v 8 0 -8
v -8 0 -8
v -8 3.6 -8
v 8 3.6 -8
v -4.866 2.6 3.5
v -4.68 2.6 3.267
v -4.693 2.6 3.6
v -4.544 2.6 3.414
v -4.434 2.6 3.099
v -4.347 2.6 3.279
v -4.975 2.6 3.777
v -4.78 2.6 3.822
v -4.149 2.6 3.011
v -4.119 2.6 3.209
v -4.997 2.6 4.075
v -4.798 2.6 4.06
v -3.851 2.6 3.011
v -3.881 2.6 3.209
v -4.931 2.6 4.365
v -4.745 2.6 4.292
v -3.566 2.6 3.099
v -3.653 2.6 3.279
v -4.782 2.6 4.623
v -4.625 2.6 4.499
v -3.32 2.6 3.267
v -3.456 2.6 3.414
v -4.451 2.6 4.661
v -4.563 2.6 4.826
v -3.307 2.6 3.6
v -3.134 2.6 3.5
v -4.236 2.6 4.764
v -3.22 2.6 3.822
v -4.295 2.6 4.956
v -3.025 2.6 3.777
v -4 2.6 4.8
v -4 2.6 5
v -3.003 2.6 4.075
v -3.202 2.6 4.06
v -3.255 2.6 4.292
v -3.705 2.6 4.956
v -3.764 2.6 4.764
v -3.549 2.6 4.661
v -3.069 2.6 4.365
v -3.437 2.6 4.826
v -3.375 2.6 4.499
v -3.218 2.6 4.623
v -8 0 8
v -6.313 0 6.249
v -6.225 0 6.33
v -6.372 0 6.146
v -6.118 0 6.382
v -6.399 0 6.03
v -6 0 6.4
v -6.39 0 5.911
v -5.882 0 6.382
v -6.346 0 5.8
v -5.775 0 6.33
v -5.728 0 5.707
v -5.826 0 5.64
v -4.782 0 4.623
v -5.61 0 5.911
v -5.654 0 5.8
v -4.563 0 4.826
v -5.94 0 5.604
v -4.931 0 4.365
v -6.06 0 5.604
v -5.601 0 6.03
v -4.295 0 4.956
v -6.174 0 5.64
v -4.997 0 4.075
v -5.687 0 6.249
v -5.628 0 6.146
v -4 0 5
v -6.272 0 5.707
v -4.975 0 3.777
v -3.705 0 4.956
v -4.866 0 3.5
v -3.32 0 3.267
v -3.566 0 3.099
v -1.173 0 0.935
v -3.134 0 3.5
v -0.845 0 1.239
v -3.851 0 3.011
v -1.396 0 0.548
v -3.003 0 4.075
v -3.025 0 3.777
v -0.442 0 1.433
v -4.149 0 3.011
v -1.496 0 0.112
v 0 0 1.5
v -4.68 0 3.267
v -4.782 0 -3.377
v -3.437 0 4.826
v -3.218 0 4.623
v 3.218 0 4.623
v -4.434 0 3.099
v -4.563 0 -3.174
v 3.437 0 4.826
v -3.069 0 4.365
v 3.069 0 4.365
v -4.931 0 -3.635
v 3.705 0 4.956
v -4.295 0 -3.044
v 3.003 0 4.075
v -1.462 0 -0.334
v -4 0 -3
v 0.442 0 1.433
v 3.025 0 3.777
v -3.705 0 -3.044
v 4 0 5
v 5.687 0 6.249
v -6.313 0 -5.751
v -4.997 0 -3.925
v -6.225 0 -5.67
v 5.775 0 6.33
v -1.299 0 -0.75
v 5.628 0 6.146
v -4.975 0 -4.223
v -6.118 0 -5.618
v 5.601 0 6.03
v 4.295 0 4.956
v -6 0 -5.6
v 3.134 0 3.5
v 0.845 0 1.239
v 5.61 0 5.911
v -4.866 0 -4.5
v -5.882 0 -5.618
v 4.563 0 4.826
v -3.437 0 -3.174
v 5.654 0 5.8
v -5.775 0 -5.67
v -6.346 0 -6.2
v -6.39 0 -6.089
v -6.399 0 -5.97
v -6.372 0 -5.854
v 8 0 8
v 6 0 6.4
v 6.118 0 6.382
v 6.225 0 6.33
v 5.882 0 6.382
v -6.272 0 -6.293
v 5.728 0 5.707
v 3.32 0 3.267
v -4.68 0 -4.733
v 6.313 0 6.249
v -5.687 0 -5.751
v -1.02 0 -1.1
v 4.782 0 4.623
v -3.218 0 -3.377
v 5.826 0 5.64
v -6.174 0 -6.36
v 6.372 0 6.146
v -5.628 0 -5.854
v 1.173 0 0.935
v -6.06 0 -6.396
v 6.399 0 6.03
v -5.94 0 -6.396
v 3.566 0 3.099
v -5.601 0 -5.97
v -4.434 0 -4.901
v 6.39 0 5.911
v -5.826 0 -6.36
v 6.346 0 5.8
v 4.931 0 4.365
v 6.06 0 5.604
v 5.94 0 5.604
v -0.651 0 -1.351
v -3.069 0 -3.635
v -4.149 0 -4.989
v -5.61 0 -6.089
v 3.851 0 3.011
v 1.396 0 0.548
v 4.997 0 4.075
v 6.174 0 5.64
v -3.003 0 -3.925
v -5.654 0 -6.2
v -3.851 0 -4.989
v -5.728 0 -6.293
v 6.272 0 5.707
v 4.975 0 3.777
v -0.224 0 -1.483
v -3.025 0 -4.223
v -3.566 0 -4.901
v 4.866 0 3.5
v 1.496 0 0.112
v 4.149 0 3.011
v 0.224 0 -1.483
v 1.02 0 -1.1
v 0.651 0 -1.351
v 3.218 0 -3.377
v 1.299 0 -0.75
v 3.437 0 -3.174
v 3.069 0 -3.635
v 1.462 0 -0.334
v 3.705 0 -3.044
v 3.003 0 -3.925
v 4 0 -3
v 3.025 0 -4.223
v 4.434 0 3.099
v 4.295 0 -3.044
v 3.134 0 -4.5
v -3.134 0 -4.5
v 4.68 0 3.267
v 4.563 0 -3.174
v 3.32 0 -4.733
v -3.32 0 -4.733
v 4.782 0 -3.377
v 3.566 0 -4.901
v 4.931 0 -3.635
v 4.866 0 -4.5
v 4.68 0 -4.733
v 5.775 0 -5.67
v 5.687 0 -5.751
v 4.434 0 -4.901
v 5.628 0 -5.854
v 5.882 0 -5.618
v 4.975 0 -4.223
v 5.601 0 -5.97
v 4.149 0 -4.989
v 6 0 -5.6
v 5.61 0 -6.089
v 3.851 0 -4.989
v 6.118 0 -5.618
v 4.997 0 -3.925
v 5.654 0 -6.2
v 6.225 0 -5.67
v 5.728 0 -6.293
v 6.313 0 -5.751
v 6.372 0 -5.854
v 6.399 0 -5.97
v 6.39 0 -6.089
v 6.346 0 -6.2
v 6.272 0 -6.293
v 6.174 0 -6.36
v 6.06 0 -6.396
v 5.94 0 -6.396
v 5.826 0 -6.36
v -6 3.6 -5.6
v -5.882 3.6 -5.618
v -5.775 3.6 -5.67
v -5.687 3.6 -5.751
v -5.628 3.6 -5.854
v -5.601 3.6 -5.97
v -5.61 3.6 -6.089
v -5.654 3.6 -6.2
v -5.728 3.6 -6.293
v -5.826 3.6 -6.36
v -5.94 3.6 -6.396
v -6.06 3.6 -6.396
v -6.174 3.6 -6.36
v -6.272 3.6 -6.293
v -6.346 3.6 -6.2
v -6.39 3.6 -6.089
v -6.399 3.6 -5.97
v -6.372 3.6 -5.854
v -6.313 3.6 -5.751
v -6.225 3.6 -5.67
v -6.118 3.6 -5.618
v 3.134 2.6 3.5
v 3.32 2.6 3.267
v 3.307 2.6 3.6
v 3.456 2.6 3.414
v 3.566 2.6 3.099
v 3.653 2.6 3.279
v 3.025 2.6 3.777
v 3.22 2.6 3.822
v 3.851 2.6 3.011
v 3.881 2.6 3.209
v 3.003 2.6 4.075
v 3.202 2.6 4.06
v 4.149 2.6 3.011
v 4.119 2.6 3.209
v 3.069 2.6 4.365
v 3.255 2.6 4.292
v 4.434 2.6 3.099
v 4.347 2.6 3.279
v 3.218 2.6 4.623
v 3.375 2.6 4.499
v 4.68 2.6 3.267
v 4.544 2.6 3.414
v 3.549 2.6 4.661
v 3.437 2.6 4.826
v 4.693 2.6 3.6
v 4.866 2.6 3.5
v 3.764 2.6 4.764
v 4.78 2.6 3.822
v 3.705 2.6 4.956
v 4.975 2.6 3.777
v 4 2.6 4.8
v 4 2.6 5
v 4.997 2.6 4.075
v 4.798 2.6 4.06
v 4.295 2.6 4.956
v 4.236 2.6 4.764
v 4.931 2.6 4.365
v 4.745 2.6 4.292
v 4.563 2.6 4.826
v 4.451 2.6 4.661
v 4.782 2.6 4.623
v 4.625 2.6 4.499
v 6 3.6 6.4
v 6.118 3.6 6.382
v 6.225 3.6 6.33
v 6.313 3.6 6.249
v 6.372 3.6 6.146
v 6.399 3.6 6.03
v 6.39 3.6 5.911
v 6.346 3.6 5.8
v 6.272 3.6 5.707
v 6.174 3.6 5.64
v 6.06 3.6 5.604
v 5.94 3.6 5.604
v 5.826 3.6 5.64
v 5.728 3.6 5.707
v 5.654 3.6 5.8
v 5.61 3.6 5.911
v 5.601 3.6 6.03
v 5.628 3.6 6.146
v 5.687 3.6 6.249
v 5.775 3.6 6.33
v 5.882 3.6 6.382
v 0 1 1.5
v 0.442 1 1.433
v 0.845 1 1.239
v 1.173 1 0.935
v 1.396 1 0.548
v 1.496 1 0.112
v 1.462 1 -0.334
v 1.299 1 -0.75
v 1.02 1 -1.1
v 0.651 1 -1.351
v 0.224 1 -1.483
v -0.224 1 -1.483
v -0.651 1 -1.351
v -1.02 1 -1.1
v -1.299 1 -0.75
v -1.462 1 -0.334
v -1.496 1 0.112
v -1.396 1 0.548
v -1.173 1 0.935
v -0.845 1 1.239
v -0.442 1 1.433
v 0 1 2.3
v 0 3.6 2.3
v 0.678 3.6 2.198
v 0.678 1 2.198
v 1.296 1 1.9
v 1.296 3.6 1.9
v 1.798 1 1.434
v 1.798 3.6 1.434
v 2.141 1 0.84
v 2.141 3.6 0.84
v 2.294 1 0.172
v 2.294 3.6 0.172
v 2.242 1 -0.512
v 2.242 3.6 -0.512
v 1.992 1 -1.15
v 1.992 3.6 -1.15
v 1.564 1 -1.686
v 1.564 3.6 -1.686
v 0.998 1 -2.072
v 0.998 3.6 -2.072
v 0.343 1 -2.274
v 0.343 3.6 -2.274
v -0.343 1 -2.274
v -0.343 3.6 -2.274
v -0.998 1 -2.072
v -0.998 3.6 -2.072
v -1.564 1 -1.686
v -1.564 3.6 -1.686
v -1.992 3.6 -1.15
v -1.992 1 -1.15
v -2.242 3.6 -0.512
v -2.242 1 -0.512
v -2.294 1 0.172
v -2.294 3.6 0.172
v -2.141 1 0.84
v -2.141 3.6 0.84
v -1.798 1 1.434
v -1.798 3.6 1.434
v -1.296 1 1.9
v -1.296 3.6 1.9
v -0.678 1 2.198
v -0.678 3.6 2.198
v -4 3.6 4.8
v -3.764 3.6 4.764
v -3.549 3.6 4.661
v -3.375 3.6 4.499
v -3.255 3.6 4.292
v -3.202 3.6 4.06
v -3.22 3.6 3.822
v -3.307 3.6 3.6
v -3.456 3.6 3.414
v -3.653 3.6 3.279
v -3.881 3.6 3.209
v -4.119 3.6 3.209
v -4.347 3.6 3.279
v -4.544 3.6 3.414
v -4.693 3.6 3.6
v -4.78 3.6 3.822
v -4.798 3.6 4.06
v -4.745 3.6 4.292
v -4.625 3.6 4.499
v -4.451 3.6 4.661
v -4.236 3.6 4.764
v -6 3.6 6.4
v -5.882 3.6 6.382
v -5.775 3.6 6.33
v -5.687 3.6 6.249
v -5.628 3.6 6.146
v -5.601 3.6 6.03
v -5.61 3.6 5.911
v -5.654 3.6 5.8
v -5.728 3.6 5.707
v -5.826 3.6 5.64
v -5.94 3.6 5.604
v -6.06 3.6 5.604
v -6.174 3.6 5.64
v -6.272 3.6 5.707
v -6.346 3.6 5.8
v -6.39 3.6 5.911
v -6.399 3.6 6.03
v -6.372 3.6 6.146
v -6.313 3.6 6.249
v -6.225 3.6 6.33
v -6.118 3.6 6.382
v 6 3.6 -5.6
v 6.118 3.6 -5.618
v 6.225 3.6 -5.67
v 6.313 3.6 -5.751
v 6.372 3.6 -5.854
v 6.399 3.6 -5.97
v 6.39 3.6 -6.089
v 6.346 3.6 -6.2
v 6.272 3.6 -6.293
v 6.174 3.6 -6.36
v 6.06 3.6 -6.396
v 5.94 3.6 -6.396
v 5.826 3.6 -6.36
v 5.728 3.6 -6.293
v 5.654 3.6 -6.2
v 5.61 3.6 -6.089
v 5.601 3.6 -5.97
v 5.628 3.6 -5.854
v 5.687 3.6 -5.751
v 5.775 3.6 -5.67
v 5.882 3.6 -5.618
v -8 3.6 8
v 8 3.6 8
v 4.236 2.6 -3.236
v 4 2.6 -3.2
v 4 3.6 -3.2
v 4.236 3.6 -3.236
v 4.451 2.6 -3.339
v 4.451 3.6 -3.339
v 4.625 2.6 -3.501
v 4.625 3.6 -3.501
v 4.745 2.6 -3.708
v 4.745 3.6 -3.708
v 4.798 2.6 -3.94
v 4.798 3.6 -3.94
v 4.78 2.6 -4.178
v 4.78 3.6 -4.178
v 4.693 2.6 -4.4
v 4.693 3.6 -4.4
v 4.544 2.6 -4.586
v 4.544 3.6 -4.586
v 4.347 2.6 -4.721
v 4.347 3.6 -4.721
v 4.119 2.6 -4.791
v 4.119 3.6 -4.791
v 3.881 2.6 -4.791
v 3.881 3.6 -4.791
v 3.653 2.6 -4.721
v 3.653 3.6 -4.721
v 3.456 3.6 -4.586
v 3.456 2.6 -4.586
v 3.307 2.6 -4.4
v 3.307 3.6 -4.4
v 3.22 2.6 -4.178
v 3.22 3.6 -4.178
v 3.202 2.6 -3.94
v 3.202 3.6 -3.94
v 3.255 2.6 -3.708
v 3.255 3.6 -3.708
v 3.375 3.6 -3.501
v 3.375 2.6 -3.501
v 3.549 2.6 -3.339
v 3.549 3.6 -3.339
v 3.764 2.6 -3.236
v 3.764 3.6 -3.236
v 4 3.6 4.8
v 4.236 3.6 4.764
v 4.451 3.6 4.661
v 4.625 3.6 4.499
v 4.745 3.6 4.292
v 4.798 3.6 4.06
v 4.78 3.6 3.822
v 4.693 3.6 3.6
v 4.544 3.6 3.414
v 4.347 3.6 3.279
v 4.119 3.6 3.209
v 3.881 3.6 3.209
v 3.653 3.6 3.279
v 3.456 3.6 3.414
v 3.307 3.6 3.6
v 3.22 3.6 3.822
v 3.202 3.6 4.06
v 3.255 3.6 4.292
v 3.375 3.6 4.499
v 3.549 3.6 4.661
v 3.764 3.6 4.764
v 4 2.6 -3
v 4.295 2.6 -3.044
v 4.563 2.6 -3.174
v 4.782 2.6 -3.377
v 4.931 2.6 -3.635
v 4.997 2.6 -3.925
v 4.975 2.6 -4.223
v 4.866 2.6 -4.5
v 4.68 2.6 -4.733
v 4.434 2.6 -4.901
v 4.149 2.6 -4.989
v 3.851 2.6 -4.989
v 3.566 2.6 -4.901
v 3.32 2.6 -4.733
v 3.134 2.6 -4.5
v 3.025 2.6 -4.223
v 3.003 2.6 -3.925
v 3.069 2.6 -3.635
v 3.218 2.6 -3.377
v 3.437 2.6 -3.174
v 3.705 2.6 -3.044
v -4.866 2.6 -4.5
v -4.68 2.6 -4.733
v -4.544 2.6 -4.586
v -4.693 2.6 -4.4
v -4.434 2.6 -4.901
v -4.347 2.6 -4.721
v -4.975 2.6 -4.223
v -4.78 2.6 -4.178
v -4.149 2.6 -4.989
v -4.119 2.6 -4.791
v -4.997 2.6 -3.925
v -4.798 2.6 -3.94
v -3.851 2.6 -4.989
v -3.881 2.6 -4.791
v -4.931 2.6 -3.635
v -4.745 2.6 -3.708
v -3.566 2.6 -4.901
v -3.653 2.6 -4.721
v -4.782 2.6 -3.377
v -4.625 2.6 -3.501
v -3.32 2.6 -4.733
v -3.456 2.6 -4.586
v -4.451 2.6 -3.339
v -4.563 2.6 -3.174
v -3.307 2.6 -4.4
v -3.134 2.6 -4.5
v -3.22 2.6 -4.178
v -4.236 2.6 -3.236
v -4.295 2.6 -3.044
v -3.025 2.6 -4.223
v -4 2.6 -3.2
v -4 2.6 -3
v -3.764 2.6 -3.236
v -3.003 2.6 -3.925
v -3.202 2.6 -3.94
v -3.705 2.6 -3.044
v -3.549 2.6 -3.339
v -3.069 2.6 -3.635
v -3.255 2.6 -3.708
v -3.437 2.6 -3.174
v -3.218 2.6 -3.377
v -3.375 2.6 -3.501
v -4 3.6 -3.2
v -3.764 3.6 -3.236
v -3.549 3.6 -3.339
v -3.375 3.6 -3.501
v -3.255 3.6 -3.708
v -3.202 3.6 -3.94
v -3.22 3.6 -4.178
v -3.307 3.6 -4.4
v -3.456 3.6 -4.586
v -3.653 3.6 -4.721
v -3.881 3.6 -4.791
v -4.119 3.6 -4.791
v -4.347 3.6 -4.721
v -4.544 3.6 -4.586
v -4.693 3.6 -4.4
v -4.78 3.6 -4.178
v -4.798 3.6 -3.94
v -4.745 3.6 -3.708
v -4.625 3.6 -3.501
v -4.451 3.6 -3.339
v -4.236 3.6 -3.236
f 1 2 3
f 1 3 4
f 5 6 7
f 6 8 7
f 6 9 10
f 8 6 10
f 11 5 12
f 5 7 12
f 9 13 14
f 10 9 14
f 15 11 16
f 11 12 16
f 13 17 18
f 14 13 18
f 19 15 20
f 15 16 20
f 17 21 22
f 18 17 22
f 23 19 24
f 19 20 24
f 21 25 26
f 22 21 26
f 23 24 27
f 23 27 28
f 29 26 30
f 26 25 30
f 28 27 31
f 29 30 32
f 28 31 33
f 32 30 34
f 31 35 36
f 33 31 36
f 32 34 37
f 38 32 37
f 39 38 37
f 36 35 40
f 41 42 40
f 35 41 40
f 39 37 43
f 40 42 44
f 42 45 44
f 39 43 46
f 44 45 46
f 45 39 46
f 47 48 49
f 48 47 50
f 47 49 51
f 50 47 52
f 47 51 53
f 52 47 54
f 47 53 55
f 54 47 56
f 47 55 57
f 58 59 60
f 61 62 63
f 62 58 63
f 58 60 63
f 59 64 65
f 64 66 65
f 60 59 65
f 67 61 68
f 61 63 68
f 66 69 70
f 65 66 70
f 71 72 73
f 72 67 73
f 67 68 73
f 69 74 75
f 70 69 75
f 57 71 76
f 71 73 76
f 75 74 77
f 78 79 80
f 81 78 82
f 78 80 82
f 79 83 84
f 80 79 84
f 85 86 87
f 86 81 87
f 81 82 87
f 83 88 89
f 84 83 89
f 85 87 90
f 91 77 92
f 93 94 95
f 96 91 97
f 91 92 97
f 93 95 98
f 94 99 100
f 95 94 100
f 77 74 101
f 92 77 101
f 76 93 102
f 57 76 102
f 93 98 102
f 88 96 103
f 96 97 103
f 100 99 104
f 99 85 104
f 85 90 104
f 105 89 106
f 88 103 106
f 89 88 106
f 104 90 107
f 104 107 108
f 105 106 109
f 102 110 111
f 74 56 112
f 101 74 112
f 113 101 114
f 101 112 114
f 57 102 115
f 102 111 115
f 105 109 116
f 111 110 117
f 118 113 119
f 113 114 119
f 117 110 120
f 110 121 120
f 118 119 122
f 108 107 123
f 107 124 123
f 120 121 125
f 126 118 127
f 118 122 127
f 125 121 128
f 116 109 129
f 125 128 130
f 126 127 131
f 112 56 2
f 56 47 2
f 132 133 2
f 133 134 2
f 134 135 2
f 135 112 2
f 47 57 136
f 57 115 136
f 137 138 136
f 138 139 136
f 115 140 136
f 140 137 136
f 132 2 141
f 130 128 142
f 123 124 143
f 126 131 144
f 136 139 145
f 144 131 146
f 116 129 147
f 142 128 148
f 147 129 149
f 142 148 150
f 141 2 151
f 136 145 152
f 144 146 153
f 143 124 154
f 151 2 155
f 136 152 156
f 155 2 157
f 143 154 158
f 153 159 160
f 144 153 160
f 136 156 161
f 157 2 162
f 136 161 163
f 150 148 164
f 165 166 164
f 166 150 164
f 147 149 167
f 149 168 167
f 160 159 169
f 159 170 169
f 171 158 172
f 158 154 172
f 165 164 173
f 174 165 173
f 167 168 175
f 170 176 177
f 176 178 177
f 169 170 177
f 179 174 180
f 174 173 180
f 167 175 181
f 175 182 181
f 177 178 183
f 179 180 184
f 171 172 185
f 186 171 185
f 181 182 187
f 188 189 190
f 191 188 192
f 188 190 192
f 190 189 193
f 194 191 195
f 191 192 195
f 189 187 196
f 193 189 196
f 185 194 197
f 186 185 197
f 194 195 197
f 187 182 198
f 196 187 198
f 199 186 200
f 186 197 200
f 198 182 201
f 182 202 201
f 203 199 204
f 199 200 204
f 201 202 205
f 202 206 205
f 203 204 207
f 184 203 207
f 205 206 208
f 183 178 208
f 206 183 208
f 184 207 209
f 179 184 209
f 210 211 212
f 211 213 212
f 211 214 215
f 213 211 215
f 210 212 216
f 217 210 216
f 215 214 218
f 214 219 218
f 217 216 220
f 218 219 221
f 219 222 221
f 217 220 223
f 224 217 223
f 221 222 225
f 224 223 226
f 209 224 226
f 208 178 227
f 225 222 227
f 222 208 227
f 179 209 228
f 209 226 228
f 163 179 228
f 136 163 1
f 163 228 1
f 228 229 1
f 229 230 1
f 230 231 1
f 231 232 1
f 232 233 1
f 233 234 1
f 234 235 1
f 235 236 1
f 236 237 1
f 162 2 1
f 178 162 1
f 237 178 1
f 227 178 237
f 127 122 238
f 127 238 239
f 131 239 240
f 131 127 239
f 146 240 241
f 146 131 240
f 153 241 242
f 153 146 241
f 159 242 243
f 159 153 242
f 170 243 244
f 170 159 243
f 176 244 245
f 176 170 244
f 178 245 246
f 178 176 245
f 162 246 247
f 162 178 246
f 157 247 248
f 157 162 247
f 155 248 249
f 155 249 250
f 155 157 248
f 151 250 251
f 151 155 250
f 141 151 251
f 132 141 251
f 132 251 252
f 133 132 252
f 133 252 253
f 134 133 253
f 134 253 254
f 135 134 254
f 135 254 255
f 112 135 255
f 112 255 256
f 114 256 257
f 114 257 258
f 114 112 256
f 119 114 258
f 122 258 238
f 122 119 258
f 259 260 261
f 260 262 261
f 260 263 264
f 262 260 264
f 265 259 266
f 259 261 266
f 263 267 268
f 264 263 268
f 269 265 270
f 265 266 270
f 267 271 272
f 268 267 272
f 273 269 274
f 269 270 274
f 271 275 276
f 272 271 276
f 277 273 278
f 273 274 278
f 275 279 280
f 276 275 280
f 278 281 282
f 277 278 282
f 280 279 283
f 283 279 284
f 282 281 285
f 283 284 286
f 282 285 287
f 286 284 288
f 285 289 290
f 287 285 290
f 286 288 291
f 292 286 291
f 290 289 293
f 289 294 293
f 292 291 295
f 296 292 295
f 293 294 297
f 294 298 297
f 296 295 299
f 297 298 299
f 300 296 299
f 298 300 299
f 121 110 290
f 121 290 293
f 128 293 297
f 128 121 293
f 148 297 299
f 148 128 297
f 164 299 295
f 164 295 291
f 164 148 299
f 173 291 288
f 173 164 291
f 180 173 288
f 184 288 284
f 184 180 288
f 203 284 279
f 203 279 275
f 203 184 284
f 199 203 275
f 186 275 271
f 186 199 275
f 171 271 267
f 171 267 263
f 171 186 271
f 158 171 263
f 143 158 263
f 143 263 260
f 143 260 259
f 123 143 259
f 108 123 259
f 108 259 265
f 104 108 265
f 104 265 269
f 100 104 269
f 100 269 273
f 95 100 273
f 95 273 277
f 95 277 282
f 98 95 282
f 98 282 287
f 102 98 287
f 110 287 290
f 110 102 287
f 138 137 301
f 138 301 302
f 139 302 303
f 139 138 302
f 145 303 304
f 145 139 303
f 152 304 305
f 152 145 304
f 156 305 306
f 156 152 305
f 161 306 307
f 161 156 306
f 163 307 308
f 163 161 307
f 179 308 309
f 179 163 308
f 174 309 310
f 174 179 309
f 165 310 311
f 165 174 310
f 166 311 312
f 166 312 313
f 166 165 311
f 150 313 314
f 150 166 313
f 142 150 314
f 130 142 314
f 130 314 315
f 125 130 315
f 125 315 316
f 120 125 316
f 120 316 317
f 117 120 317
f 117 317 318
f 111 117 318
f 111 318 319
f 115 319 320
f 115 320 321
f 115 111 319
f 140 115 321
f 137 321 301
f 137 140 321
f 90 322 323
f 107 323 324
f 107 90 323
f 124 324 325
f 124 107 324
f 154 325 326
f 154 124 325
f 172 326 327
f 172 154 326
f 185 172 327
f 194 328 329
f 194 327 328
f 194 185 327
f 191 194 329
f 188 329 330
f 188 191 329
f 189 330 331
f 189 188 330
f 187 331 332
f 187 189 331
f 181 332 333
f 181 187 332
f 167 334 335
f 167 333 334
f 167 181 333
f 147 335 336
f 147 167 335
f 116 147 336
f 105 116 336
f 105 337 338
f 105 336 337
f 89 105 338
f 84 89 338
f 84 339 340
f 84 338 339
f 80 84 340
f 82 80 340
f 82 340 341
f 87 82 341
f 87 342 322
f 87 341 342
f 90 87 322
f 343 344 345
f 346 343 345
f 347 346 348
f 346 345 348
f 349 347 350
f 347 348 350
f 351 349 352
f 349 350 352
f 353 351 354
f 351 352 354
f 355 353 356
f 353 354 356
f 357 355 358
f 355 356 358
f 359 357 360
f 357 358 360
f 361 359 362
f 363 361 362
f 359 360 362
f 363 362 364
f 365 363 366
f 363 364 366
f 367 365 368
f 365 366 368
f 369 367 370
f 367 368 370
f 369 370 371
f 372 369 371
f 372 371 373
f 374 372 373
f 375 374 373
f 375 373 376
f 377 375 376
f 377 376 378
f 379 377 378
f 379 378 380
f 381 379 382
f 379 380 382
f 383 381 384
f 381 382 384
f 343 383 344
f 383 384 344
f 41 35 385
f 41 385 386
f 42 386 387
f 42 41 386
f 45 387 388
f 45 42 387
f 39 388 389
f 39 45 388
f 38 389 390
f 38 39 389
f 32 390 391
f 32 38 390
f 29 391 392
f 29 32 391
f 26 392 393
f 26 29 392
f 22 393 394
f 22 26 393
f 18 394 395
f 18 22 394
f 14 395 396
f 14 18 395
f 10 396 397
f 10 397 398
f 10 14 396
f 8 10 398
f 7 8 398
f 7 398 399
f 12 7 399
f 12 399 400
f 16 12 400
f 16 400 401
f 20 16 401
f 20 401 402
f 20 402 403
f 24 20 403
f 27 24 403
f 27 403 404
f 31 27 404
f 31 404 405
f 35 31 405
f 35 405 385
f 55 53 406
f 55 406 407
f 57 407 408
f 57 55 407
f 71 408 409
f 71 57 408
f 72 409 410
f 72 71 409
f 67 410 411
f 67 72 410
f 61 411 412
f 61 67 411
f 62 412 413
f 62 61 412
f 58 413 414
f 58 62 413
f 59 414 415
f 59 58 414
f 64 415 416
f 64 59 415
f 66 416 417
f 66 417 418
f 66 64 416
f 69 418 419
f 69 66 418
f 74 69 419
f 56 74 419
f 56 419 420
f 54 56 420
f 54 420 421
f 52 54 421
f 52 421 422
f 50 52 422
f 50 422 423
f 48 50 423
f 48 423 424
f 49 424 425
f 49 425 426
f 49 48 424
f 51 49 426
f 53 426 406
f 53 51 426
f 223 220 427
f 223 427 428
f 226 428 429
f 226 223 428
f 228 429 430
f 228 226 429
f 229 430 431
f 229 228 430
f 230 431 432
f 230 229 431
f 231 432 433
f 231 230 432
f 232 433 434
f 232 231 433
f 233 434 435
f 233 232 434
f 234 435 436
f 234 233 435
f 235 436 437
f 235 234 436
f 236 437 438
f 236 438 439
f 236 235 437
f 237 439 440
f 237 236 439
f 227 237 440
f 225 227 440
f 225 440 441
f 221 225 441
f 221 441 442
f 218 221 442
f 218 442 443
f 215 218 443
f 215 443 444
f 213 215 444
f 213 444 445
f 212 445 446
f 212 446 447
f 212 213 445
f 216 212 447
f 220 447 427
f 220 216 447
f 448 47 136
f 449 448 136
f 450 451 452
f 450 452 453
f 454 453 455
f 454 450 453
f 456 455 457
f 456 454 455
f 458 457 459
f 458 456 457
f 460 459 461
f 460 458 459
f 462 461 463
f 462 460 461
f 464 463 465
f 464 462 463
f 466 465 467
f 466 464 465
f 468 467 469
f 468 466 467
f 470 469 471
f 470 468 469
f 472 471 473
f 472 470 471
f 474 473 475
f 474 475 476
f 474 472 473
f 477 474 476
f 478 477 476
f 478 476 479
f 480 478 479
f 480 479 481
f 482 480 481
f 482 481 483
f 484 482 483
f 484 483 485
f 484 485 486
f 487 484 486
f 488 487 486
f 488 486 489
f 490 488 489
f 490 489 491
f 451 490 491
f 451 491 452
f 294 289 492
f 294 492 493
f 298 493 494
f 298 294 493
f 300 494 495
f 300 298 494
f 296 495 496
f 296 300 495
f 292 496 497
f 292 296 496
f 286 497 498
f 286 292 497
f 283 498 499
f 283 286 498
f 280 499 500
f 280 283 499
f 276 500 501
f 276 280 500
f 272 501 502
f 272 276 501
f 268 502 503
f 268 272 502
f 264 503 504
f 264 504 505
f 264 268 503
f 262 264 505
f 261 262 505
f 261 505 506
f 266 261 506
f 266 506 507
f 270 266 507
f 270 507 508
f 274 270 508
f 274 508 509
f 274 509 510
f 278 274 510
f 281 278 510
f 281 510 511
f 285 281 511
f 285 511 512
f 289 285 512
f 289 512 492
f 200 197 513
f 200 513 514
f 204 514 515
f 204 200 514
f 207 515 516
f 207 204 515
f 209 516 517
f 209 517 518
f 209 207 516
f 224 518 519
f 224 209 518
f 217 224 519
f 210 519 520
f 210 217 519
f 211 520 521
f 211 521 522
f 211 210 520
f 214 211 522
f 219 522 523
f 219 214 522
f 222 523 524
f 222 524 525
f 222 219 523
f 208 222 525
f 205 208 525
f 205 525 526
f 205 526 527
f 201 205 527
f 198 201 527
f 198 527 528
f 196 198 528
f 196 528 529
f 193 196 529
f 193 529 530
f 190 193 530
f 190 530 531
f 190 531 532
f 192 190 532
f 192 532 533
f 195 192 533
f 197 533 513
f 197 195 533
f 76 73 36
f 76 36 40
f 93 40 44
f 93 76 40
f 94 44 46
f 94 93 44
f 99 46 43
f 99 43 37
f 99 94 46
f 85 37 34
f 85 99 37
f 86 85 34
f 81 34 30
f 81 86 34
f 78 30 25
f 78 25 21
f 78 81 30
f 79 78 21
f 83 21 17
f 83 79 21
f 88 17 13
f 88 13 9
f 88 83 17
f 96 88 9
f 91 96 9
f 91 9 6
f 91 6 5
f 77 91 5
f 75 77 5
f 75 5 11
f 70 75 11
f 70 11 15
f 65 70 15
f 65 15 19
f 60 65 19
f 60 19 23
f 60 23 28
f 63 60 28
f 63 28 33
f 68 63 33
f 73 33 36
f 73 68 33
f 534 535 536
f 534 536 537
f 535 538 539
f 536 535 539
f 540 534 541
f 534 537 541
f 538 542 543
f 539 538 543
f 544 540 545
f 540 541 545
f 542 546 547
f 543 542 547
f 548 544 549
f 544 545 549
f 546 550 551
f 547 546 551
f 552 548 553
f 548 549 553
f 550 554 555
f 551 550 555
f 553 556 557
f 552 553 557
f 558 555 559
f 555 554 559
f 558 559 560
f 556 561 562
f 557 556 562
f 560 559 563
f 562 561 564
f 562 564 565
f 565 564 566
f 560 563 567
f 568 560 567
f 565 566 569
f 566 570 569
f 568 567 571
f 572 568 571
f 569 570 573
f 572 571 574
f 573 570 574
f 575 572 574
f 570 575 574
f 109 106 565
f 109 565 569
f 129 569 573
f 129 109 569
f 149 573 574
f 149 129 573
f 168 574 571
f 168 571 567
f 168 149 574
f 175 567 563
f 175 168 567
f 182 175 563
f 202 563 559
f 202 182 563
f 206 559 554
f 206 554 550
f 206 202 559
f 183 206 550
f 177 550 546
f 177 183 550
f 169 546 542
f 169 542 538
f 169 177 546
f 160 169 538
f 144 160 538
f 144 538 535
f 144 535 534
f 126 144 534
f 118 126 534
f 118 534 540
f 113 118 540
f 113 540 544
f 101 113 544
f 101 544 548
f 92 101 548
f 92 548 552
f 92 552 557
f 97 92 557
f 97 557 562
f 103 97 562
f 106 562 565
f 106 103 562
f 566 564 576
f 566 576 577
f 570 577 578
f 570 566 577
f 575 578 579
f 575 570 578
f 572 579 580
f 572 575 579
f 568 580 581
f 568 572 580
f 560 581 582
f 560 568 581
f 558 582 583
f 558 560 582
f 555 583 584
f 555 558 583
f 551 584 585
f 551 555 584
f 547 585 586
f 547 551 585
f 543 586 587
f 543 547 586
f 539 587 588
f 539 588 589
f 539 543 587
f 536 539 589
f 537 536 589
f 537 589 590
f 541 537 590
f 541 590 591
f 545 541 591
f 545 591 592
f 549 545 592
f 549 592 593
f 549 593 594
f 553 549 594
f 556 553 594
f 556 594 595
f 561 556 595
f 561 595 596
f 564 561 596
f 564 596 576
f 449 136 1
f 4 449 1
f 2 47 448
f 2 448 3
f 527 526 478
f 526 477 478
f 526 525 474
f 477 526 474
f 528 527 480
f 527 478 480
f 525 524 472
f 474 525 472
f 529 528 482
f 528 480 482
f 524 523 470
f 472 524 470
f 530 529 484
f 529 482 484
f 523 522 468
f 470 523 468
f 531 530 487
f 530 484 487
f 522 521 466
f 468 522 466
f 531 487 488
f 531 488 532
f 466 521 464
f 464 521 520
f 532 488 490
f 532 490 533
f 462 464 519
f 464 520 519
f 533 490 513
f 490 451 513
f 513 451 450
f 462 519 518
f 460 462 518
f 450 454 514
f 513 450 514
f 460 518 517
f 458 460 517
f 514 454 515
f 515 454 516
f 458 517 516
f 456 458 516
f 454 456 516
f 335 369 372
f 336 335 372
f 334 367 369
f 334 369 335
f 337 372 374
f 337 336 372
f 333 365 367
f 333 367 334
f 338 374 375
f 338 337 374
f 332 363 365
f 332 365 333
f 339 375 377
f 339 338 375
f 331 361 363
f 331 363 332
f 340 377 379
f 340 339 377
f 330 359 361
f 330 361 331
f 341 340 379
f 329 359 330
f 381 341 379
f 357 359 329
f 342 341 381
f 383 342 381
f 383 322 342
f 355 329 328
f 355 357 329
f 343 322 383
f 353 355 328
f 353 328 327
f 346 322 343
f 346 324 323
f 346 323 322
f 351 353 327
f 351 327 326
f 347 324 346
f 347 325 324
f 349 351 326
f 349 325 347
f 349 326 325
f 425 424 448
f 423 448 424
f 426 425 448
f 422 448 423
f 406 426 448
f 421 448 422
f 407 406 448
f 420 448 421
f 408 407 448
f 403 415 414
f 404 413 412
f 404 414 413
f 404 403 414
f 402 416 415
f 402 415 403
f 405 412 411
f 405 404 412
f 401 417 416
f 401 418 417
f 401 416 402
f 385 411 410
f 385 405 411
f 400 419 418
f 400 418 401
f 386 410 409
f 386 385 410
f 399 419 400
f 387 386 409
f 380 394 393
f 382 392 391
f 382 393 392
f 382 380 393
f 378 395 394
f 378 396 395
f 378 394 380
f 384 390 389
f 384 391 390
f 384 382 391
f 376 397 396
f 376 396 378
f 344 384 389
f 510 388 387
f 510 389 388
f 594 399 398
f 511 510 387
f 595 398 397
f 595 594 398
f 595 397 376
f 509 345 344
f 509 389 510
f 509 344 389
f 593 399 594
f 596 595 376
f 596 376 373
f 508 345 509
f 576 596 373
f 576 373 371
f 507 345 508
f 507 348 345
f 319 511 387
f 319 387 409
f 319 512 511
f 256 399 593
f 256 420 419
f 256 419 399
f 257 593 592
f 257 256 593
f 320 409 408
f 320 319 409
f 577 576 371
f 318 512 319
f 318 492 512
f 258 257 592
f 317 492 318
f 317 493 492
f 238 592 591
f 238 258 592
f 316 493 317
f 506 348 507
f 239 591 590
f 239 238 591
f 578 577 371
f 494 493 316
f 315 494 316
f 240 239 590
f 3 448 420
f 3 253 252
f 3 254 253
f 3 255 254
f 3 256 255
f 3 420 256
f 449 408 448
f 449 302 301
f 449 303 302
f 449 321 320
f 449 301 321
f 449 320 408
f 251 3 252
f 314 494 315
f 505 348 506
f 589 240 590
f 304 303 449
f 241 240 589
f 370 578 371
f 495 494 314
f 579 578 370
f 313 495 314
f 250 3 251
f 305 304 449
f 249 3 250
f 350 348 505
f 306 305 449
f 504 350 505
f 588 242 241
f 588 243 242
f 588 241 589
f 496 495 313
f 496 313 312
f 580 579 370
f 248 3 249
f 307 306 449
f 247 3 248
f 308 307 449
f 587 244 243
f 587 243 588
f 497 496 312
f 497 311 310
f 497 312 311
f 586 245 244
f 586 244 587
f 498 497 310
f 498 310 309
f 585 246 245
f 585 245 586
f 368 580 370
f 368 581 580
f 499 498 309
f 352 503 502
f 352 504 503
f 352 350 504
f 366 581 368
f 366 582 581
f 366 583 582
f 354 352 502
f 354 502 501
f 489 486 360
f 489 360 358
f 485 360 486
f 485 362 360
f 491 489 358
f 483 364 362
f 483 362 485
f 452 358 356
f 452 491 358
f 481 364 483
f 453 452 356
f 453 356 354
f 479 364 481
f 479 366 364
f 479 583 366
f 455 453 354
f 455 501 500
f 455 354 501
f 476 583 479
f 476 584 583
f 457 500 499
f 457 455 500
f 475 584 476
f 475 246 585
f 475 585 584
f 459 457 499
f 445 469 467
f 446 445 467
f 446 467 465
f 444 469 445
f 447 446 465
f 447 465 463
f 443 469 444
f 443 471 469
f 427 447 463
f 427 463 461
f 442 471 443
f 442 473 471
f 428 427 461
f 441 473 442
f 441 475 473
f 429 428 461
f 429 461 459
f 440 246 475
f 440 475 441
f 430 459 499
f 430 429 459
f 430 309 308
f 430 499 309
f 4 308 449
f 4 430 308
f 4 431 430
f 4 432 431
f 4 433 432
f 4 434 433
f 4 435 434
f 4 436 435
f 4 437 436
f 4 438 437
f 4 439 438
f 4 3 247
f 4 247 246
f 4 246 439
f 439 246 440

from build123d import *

# Parameters (mm, degrees)
SKETCH_1_W          = 16
SKETCH_1_H          = 16
SKETCH_1_R          = 1.5
SKETCH_1_R_2        = 0.8
SKETCH_1_R_3        = 0.4
EXTRUDE_1_DEPTH     = 3.6
CUT_EXTRUDE_START   = 3.6
SKETCH_1_3_R        = 2.3
CUT_EXTRUDE_1_DEPTH = 2.6
SKETCH_1_4_R        = 1
CUT_EXTRUDE_2_DEPTH = 2.6


with BuildPart() as part:
    # 草图1 → 凸台-拉伸1 (new body)
    with BuildSketch(Plane(origin=(0, 0, 0), x_dir=(1, 0, 0), z_dir=(0, 1, 0))):
        Rectangle(SKETCH_1_W, SKETCH_1_H)
        with Locations(Location((0, 0, 0), (0, 0, 270))):
            Circle(SKETCH_1_R, mode=Mode.SUBTRACT)
        with Locations(Location((-4, 4, 0), (0, 0, 270))):
            Circle(SKETCH_1_R_2, mode=Mode.SUBTRACT)
        with Locations(Location((4, 4, 0), (0, 0, 270))):
            Circle(SKETCH_1_R_2, mode=Mode.SUBTRACT)
        with Locations(Location((-4, -4, 0), (0, 0, 270))):
            Circle(SKETCH_1_R_2, mode=Mode.SUBTRACT)
        with Locations(Location((4, -4, 0), (0, 0, 270))):
            Circle(SKETCH_1_R_2, mode=Mode.SUBTRACT)
        with Locations(Location((-6, 6, 0), (0, 0, 270))):
            Circle(SKETCH_1_R_3, mode=Mode.SUBTRACT)
        with Locations(Location((6, 6, 0), (0, 0, 270))):
            Circle(SKETCH_1_R_3, mode=Mode.SUBTRACT)
        with Locations(Location((6, -6, 0), (0, 0, 270))):
            Circle(SKETCH_1_R_3, mode=Mode.SUBTRACT)
        with Locations(Location((-6, -6, 0), (0, 0, 270))):
            Circle(SKETCH_1_R_3, mode=Mode.SUBTRACT)
    extrude(amount=EXTRUDE_1_DEPTH)

    # 草图1<3> → 切除-拉伸1 (cut)
    with BuildSketch(Plane(origin=(0, 0, 0), x_dir=(1, 0, 0), z_dir=(0, 1, 0)).offset(CUT_EXTRUDE_START)):
        with Locations(Location((0, 0, 0), (0, 0, 270))):
            Circle(SKETCH_1_3_R)
    extrude(amount=-CUT_EXTRUDE_1_DEPTH, mode=Mode.SUBTRACT)

    # 草图1<4> → 切除-拉伸2 (cut)
    with BuildSketch(Plane(origin=(0, 0, 0), x_dir=(1, 0, 0), z_dir=(0, 1, 0))):
        with Locations(Location((-4, 4, 0), (0, 0, 270))):
            Circle(SKETCH_1_4_R)
        with Locations(Location((4, 4, 0), (0, 0, 270))):
            Circle(SKETCH_1_4_R)
        with Locations(Location((4, -4, 0), (0, 0, 270))):
            Circle(SKETCH_1_4_R)
        with Locations(Location((-4, -4, 0), (0, 0, 270))):
            Circle(SKETCH_1_4_R)
    extrude(amount=CUT_EXTRUDE_2_DEPTH, mode=Mode.SUBTRACT)


solid = part.part
